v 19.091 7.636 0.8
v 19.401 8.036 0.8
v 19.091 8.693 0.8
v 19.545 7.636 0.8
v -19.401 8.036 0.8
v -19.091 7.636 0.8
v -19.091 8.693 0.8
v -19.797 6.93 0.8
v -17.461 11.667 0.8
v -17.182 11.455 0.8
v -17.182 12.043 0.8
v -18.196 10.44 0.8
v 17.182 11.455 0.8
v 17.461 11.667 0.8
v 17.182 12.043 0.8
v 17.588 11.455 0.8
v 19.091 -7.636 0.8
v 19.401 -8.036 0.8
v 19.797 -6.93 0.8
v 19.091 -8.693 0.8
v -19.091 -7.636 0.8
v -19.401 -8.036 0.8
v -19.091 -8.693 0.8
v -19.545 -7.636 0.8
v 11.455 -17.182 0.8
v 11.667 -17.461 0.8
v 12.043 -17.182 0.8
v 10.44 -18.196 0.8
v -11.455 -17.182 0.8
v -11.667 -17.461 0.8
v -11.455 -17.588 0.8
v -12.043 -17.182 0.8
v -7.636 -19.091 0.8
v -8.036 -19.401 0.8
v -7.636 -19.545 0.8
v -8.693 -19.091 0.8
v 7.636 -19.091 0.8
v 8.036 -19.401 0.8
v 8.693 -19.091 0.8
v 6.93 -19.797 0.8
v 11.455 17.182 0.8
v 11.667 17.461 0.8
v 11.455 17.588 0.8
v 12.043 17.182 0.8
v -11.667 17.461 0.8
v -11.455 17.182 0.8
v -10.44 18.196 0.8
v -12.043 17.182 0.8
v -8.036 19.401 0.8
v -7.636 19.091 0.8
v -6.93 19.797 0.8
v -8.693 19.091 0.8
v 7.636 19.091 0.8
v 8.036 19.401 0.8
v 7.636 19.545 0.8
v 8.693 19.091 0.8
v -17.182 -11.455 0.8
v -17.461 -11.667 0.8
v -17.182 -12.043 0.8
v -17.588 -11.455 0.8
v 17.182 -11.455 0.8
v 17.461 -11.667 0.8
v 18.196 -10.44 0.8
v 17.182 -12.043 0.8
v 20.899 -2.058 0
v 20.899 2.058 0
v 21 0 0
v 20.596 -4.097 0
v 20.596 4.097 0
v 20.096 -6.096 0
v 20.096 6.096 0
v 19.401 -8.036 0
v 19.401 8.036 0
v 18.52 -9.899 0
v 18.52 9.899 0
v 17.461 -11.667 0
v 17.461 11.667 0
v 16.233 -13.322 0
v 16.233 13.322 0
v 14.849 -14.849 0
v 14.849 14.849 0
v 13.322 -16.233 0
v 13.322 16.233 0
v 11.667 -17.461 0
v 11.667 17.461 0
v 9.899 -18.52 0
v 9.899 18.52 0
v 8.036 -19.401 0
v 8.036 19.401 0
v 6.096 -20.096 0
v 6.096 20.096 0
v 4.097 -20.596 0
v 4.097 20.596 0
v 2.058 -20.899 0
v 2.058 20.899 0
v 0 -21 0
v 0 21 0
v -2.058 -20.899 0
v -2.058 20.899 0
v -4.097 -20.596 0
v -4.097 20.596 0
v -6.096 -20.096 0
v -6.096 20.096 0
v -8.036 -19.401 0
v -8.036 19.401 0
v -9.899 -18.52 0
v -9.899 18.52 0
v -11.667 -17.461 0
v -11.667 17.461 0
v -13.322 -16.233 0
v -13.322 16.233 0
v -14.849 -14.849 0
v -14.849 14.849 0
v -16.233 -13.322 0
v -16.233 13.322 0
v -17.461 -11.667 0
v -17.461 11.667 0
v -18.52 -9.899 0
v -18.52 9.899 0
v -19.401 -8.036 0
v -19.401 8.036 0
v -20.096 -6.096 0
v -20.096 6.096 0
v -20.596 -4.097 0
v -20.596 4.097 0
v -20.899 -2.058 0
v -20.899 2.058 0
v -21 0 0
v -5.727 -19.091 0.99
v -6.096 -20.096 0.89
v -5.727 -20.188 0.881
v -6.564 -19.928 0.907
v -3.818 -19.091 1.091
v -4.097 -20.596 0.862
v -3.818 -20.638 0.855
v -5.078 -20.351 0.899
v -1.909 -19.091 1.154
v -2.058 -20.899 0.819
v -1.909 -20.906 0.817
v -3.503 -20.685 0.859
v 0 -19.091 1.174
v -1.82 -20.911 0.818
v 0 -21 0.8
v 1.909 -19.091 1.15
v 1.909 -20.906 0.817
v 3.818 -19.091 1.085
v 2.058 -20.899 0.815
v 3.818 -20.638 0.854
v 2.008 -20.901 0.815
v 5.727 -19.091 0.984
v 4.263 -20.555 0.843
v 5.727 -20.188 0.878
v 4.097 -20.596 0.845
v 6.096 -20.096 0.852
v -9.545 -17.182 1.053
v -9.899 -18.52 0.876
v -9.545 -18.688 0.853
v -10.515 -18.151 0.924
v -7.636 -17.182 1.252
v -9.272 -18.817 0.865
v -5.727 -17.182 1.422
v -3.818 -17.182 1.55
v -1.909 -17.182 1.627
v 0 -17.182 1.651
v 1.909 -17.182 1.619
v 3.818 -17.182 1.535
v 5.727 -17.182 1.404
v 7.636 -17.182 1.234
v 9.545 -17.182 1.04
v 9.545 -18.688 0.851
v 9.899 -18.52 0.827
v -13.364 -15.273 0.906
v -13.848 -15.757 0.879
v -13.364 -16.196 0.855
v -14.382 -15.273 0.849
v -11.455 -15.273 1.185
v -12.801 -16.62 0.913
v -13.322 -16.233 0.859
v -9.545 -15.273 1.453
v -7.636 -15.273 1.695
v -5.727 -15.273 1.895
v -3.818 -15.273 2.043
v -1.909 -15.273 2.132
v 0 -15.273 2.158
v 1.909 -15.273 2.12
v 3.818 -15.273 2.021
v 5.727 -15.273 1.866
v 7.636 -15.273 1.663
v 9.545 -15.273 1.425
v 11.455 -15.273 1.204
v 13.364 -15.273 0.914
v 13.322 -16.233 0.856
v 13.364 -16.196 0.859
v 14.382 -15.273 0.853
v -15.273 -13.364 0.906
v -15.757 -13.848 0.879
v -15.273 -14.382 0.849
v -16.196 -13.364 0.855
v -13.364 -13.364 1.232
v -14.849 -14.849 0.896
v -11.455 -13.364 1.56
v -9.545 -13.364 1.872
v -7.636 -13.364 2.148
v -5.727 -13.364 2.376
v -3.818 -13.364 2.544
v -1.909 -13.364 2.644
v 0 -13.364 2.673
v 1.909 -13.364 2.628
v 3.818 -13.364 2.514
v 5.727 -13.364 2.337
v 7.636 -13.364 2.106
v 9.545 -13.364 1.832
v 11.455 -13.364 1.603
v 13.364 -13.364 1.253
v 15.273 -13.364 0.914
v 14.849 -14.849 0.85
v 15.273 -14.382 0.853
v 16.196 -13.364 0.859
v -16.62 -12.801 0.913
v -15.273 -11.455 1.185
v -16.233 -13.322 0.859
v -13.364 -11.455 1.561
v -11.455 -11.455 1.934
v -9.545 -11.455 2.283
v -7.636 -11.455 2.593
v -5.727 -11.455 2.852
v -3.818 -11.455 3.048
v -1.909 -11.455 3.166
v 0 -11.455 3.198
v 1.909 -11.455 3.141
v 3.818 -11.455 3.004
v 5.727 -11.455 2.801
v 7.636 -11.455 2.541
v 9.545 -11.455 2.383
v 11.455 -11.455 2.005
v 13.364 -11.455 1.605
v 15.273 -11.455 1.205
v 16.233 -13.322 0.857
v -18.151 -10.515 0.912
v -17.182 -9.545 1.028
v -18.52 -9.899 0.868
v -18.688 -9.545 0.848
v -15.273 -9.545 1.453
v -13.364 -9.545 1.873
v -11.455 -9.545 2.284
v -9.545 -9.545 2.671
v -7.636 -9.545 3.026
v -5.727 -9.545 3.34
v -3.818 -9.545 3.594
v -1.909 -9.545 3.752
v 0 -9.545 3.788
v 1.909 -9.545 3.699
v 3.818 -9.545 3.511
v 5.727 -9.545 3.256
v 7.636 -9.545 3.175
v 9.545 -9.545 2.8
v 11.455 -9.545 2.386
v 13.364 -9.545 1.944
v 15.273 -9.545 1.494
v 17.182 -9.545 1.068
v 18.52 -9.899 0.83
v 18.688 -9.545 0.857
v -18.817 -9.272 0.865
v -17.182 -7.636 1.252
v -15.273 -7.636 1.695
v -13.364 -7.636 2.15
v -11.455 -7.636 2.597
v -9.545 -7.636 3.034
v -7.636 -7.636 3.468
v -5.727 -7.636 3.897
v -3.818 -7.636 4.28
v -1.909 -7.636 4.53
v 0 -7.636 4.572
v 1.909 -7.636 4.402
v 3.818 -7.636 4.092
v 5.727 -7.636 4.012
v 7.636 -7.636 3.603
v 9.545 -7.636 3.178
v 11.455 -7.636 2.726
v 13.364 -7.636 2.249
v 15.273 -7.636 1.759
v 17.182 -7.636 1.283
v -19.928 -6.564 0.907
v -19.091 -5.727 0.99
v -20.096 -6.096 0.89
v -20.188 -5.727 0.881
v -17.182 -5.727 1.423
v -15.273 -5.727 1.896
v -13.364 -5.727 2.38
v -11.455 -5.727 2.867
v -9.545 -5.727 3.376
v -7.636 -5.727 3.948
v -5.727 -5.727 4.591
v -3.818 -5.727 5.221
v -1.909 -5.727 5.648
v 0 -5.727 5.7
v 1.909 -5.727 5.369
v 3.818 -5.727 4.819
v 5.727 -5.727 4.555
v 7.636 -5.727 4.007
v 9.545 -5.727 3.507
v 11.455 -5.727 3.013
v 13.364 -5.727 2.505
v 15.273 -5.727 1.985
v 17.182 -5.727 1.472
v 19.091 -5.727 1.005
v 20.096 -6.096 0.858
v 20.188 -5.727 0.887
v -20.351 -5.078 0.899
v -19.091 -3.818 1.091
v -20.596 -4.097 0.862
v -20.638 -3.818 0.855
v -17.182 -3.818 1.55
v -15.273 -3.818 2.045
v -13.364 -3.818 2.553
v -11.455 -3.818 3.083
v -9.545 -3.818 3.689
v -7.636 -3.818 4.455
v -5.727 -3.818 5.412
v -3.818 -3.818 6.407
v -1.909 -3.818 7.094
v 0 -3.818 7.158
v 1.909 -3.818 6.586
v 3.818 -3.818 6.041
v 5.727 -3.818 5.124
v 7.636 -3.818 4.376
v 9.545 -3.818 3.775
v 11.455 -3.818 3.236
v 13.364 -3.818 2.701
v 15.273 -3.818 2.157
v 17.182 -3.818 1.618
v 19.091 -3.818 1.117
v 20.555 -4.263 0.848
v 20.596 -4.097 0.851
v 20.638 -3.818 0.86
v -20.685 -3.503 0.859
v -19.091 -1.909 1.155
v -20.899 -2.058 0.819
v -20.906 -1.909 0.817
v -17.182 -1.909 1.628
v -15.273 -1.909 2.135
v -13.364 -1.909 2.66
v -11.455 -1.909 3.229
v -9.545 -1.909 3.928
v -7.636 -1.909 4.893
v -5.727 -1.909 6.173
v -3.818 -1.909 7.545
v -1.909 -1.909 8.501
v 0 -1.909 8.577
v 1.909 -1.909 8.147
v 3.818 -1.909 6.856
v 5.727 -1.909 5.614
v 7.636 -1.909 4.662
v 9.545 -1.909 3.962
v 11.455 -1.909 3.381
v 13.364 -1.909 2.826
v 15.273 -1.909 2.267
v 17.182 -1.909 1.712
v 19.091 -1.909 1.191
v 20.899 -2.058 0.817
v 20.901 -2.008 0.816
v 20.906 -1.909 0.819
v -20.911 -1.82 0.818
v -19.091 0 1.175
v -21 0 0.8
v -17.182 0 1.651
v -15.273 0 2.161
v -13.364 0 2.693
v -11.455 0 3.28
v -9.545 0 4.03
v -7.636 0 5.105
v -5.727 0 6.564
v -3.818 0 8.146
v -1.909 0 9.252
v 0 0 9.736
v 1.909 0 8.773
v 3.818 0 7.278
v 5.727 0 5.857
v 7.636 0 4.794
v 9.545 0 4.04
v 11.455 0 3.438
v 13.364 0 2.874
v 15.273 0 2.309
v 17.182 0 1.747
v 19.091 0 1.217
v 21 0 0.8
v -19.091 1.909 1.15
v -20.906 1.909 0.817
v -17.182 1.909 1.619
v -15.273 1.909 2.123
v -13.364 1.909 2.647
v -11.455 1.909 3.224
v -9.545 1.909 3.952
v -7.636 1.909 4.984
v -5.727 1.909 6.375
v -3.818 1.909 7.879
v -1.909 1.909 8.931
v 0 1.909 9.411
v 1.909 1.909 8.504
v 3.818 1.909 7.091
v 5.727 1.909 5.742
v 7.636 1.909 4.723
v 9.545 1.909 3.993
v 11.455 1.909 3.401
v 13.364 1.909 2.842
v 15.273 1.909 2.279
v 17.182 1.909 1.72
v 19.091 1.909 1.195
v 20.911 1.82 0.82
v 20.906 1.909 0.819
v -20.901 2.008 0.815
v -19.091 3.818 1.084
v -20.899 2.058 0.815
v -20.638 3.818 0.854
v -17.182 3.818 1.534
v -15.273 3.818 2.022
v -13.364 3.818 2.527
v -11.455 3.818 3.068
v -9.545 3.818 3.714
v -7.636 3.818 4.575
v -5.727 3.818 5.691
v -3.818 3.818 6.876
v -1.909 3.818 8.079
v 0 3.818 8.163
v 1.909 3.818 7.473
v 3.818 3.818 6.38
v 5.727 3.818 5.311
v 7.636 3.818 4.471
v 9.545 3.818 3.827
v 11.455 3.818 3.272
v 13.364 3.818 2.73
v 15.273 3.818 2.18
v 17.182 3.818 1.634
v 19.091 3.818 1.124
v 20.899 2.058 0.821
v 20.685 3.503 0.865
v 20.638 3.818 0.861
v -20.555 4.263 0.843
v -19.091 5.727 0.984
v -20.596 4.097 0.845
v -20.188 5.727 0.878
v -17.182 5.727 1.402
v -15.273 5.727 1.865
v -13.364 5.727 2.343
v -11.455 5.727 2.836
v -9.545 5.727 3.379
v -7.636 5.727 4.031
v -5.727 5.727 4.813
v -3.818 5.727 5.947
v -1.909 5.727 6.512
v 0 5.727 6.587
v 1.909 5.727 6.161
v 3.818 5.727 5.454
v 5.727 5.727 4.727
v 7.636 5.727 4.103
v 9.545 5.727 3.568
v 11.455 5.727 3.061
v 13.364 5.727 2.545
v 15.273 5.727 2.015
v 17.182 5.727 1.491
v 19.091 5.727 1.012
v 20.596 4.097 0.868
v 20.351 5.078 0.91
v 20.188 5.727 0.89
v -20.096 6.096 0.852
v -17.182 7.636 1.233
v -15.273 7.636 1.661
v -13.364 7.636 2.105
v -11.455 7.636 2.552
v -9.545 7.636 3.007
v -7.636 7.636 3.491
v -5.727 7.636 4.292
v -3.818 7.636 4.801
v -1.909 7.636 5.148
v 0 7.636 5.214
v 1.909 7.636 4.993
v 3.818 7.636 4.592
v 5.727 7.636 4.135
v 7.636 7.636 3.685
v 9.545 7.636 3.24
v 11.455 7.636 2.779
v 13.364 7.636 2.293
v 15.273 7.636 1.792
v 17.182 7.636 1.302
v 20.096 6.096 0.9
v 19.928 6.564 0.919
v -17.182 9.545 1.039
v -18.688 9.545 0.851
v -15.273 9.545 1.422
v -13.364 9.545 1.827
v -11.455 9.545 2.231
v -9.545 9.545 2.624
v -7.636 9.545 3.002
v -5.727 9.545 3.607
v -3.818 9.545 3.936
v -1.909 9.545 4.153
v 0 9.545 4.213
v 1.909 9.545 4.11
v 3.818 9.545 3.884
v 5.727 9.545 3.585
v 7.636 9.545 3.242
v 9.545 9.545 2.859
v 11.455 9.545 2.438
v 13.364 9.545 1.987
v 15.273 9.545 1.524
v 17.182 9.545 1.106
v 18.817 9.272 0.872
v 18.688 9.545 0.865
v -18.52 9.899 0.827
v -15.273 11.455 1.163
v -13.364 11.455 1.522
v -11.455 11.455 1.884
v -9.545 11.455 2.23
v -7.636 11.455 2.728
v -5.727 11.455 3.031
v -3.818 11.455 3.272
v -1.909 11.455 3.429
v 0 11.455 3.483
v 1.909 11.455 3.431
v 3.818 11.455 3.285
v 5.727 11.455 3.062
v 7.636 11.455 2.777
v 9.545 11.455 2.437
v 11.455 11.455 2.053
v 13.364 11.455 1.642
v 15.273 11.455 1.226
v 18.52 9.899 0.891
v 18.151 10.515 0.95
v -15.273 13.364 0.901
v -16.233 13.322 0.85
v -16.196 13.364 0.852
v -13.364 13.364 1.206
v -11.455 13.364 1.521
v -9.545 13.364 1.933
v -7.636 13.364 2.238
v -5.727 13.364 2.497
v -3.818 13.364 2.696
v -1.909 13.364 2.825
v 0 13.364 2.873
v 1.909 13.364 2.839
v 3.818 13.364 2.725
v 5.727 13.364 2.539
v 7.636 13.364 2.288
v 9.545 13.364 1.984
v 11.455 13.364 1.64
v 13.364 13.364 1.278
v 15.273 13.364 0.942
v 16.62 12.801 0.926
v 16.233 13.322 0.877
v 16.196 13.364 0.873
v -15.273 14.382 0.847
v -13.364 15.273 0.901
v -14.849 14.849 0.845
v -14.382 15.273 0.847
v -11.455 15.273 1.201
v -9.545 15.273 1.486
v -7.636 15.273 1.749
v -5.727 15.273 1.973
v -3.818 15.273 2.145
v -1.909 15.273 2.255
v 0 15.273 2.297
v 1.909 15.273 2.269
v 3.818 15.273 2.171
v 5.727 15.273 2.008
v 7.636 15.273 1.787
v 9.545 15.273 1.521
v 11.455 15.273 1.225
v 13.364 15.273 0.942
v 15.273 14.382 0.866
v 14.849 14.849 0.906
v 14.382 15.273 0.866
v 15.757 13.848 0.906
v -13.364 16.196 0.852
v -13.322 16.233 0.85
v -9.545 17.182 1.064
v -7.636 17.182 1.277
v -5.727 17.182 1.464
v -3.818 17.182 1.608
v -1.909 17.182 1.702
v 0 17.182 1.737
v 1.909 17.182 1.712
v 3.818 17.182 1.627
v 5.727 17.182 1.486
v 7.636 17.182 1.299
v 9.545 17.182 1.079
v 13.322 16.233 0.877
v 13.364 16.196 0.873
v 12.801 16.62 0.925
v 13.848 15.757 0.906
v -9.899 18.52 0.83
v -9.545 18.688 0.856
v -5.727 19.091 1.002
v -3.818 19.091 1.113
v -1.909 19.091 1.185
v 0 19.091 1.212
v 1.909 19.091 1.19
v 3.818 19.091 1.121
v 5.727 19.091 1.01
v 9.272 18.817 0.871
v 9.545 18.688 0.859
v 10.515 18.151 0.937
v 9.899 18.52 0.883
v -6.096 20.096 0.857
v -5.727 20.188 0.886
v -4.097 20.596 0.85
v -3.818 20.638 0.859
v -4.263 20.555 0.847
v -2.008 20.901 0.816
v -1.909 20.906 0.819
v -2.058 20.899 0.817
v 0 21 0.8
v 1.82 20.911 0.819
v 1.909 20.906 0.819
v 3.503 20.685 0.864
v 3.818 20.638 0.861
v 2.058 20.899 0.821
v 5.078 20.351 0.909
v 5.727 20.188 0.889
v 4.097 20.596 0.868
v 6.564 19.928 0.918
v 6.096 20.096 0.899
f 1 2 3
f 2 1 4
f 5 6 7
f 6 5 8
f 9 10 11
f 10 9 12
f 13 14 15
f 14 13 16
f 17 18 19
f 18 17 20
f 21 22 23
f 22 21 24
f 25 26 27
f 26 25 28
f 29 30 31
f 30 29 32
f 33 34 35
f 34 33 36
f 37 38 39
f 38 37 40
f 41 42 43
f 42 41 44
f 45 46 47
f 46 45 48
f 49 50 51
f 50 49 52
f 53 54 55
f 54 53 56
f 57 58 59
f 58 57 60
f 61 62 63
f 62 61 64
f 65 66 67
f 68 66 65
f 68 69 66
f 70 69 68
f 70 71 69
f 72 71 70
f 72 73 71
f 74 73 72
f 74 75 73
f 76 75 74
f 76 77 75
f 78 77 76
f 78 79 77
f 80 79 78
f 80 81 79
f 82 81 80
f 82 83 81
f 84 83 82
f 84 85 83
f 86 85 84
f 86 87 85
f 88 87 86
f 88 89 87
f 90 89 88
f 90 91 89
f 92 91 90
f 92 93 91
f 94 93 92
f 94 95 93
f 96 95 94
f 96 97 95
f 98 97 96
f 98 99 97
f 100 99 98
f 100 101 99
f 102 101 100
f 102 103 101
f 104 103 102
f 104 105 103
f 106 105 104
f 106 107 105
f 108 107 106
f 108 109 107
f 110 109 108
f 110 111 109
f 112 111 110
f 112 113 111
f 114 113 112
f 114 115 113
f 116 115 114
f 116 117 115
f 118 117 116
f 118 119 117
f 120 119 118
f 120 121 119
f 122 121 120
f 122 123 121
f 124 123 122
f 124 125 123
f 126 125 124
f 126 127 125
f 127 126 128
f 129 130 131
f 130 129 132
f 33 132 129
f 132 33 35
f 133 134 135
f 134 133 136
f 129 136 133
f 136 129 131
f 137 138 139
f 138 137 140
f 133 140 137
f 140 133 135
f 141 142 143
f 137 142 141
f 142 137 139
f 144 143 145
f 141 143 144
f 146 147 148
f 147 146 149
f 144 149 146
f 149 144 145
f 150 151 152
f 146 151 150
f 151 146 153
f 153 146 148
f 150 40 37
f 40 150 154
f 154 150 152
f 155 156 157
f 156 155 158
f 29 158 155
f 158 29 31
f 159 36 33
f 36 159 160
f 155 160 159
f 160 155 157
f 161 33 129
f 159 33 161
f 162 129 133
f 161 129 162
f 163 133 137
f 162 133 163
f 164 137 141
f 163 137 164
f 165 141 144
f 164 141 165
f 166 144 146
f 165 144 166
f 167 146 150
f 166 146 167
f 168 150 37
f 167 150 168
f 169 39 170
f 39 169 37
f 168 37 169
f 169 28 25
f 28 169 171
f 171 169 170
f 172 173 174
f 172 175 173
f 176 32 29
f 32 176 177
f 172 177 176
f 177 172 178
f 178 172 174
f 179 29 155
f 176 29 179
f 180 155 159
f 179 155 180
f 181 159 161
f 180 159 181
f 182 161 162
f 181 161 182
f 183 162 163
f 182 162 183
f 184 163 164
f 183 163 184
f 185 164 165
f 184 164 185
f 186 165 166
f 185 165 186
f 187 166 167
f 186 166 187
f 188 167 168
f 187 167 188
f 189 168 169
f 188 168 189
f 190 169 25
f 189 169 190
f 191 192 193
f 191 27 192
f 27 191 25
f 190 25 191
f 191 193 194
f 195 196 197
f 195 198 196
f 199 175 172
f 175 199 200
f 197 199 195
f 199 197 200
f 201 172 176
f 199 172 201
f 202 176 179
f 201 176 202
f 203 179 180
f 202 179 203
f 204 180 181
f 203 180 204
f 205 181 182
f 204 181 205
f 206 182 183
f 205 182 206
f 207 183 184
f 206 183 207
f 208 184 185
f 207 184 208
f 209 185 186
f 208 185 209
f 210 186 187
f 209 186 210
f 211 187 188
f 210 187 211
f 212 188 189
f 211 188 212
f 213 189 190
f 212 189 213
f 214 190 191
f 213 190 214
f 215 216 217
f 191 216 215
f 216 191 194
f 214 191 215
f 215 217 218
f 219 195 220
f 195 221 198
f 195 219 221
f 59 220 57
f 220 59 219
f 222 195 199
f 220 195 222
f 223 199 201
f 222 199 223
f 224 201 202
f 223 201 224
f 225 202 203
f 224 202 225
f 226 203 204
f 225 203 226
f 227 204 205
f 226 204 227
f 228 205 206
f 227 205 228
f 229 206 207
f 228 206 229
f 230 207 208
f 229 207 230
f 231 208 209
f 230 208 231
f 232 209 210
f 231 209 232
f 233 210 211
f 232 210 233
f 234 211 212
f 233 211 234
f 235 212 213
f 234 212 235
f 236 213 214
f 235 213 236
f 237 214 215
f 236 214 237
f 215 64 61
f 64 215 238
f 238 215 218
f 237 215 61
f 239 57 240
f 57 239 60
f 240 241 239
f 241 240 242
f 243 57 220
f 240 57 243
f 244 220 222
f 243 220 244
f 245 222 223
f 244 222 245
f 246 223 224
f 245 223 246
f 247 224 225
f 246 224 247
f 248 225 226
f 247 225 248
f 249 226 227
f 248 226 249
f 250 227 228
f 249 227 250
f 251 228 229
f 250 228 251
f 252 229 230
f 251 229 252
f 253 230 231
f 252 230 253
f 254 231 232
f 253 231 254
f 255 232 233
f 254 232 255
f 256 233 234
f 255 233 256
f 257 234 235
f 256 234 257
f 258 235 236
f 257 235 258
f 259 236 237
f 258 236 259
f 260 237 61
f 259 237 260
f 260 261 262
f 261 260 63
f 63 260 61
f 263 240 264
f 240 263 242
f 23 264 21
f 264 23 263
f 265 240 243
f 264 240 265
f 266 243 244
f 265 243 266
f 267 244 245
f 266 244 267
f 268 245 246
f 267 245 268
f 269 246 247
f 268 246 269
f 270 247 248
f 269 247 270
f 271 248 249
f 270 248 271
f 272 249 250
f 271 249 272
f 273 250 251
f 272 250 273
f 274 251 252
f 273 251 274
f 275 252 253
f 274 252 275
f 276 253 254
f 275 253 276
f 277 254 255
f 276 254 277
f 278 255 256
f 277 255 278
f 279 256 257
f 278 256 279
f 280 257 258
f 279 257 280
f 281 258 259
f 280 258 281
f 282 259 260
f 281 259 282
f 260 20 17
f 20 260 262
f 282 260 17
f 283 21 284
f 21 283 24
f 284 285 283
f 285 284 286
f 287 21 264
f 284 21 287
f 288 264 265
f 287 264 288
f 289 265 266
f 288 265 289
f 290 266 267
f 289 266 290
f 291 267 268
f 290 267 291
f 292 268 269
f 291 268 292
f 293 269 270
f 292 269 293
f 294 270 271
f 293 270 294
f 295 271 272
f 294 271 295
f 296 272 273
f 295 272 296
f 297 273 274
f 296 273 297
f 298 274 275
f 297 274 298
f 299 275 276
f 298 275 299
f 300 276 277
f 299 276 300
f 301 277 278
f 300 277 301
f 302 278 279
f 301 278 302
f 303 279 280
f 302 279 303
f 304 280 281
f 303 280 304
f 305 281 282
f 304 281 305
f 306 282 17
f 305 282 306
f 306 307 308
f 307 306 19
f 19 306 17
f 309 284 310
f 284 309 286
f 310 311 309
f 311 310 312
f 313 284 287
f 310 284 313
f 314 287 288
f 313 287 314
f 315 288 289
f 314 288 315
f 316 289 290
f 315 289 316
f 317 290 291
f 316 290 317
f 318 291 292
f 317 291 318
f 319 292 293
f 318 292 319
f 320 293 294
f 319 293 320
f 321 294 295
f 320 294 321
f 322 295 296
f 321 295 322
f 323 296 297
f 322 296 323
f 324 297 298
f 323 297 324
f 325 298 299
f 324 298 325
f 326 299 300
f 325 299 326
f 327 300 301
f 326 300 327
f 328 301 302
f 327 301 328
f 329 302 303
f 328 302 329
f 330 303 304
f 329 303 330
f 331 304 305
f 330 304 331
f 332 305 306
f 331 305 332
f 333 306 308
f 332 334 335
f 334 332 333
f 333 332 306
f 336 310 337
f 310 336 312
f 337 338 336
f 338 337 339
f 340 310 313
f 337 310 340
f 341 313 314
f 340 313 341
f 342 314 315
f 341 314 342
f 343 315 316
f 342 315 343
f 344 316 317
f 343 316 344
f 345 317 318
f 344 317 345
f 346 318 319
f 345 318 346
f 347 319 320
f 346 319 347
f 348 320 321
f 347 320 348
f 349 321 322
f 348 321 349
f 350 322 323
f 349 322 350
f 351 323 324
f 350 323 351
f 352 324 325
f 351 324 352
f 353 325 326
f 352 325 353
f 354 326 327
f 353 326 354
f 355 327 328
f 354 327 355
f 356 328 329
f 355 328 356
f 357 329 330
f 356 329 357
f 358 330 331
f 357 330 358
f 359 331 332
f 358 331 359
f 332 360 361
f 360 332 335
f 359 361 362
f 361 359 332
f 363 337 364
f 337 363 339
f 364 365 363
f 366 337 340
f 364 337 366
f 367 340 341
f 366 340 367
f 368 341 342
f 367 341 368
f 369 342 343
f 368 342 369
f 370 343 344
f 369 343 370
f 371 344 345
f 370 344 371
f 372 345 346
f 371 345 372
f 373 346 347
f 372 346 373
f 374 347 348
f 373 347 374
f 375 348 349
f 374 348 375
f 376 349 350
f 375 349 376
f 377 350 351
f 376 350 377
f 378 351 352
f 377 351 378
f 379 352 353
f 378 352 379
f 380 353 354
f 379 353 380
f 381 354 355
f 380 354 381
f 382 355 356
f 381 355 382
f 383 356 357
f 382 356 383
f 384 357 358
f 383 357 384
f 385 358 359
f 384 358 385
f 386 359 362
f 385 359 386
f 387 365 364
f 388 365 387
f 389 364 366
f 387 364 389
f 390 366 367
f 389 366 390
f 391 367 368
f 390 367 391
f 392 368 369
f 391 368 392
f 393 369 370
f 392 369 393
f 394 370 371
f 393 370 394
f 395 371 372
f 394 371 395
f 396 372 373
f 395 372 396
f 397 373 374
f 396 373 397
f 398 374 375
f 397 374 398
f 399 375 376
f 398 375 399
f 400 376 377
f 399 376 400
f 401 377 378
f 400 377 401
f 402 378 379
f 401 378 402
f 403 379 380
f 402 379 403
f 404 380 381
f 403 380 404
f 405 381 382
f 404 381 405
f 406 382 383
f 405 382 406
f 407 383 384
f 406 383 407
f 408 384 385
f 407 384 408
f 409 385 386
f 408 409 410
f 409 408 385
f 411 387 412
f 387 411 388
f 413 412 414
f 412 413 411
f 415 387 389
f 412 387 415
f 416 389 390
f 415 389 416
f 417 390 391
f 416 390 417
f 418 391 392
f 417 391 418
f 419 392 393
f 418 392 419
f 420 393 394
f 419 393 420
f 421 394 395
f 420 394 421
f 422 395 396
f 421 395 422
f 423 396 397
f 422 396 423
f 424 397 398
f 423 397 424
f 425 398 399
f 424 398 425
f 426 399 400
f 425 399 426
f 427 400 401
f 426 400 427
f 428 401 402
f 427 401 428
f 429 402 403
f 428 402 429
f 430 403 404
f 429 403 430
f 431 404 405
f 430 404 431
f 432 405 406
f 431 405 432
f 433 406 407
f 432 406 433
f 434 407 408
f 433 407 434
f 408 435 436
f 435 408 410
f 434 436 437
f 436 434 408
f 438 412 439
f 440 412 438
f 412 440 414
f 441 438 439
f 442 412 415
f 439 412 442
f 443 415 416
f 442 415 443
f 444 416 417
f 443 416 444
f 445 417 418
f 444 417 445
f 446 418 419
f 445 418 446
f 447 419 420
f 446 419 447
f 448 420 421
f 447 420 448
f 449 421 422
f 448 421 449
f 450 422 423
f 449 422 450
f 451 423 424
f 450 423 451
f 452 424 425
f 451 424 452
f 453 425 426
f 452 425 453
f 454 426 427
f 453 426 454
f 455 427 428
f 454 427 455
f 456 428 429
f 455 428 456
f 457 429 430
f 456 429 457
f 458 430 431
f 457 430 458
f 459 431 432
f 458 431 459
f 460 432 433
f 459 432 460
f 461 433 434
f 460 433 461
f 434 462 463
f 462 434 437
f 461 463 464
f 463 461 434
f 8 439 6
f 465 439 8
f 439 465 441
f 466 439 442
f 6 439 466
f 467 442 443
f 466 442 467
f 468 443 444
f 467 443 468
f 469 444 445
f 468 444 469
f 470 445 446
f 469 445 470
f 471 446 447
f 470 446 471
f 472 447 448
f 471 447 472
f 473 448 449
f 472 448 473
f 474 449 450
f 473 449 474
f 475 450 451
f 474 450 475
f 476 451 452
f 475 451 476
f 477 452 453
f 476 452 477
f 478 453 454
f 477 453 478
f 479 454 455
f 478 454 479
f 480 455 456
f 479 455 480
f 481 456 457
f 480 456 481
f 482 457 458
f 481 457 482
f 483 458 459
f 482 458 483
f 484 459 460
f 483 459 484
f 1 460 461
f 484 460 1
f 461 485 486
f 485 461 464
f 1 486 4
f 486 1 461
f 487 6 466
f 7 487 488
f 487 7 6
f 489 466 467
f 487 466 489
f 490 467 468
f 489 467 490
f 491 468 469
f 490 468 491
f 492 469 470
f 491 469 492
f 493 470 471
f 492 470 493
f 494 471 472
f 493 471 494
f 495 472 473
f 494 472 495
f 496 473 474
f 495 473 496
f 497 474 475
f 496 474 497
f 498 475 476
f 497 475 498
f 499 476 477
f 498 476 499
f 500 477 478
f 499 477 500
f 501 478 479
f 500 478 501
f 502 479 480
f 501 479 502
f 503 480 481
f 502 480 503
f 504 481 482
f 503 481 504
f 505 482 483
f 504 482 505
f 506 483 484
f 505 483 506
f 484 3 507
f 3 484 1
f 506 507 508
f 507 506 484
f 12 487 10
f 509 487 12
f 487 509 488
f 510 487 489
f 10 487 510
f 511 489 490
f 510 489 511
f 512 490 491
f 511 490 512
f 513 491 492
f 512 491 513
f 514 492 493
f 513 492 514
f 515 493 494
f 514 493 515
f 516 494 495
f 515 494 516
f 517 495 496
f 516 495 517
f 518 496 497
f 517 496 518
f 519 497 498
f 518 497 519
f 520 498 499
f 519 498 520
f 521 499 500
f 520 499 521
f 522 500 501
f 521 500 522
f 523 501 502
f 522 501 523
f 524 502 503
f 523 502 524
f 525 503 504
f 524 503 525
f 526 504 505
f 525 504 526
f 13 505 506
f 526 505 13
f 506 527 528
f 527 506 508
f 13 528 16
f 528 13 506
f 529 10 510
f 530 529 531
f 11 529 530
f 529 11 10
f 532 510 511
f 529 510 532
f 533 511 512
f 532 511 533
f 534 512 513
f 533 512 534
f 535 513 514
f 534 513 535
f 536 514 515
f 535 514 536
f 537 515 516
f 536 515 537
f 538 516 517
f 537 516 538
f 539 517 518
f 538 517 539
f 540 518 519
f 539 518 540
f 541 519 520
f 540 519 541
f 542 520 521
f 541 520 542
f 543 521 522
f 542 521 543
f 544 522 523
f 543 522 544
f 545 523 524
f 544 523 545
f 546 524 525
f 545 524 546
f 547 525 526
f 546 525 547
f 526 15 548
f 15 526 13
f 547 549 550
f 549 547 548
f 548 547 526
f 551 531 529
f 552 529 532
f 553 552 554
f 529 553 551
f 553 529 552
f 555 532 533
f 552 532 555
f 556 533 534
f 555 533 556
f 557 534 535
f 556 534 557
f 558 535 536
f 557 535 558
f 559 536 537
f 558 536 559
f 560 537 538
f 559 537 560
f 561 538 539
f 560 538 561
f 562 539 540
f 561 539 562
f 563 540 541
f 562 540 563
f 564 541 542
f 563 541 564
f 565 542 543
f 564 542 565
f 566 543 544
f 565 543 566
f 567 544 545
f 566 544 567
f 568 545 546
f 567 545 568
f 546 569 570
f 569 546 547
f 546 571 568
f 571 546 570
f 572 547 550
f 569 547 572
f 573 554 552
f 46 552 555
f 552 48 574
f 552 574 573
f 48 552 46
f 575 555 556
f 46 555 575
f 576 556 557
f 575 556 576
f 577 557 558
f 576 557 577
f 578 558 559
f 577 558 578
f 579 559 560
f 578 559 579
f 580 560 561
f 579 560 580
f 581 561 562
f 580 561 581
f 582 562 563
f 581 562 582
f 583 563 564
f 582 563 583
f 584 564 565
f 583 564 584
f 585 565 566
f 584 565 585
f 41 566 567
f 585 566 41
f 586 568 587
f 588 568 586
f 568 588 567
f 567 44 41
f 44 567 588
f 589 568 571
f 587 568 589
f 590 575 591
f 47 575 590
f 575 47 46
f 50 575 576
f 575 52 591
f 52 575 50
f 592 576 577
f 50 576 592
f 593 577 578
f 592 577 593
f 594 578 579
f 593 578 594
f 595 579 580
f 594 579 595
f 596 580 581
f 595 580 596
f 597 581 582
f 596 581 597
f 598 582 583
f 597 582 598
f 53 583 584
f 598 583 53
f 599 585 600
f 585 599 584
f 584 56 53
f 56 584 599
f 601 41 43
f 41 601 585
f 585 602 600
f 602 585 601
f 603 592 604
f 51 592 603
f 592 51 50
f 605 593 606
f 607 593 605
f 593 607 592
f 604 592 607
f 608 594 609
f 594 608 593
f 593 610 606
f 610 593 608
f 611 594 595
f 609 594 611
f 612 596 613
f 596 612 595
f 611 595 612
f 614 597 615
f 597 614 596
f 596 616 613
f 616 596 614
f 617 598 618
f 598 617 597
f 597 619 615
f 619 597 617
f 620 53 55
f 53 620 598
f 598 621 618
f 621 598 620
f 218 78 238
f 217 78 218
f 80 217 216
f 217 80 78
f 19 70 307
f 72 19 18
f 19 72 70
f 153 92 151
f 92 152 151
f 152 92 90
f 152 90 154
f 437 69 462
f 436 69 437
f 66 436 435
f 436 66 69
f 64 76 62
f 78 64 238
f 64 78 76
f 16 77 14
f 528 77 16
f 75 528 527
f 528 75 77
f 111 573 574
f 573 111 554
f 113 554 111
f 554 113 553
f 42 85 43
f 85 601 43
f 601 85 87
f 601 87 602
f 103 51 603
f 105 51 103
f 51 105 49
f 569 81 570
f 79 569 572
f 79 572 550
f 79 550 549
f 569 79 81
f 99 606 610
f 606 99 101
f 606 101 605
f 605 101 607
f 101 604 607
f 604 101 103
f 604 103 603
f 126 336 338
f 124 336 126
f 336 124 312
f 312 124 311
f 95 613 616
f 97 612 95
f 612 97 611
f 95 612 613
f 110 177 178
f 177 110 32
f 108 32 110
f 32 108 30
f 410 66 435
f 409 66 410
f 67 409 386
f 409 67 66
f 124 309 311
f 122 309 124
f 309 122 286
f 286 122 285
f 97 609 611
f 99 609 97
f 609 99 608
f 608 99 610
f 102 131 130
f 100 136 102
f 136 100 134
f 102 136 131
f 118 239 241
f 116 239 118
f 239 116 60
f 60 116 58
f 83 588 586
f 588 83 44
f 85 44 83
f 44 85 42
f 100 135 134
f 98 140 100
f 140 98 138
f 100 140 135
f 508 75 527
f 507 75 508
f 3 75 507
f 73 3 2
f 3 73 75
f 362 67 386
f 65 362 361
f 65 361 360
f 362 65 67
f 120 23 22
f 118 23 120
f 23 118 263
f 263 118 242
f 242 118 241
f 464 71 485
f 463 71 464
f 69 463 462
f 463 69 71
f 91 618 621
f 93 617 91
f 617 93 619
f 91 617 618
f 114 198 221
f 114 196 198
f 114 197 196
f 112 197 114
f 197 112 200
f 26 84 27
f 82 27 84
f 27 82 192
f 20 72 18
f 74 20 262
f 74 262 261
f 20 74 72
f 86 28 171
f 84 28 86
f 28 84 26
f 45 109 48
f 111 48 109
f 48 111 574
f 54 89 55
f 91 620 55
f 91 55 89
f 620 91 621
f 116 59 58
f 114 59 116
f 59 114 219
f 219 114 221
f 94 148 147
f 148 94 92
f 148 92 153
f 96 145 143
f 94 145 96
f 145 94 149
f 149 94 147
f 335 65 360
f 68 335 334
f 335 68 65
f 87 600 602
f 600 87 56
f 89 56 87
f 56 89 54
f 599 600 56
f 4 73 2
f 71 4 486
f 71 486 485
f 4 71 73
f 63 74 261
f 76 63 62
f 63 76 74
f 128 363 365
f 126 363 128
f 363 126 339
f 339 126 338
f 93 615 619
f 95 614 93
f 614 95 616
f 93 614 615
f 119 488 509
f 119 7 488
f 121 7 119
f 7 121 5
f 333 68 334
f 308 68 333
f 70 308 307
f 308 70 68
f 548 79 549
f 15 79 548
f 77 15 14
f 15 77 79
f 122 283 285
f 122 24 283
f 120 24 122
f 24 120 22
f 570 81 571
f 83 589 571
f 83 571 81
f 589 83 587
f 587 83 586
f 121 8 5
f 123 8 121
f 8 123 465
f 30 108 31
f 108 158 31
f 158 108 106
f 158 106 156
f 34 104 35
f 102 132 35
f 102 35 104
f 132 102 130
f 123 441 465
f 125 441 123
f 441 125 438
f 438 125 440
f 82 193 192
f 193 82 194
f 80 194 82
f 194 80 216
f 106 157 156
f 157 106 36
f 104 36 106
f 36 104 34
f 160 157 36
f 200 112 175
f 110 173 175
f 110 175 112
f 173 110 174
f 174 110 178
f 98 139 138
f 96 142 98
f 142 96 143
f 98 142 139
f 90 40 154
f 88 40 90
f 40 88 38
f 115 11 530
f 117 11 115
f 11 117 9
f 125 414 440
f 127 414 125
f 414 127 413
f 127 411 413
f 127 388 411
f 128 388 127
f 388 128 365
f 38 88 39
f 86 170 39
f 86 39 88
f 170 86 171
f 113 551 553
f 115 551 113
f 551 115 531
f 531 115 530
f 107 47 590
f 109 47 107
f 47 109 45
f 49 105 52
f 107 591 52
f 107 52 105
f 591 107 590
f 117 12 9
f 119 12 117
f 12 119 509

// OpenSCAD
// Low-Poly Faceted Rocky Mountain Base Test
$fn = 32;

module lowpoly_rocky_mountain_base(r = 21, grid_n = 22) {
    step = (2 * r) / grid_n;
    
    // Low-poly terrain height function with sharp mountain ridges and rock outcrops
    function terrain_z(x, y) = 
        let (
            dist = sqrt(x*x + y*y),
            taper = (dist >= r - 0.5) ? 0 : pow(cos(min(1.0, dist / r) * 90), 1.2),
            
            // Sharp angular low-poly ridges
            r1 = pow(abs(sin(x * 0.35 + y * 0.22 + 0.4)), 1.8) * 4.2,
            r2 = pow(abs(cos(x * 0.45 - y * 0.38 - 0.7)), 2.0) * 3.5,
            
            // Rocky peak summit
            peak = 4.8 * exp(-((x + 1.0)*(x + 1.0) + (y - 0.5)*(y - 0.5)) / 36),
            
            // Angular facet noise
            n1 = floor(sin(x * 0.8 + y * 0.6) * 3.0) * 0.4,
            n2 = floor(cos(x * 1.4 - y * 1.2) * 2.5) * 0.3,
            
            raw_h = 1.0 + peak + r1 + r2 + n1 + n2,
            
            z_val = 0.8 + max(0, raw_h - 0.8) * taper
        ) z_val;

    // Build grid vertices
    top_verts = [
        for (yi = [0 : grid_n])
            for (xi = [0 : grid_n])
                let (
                    x = -r + xi * step,
                    y = -r + yi * step,
                    z = terrain_z(x, y)
                )
                [x, y, z]
    ];
    
    bot_verts = [
        for (yi = [0 : grid_n])
            for (xi = [0 : grid_n])
                let (
                    x = -r + xi * step,
                    y = -r + yi * step
                )
                [x, y, 0]
    ];
    
    all_verts = concat(top_verts, bot_verts);
    num_pts = len(top_verts);
    
    function idx(xi, yi) = yi * (grid_n + 1) + xi;
    function bidx(xi, yi) = num_pts + yi * (grid_n + 1) + xi;
    
    // Render top faces as individual low-poly facet prisms for crisp sharp edges
    intersection() {
        cylinder(r = r, h = 12, $fn = 64);
        
        union() {
            // Flat base slab
            cylinder(r = r + 2, h = 0.8, $fn = 64);
            
            // Low-poly facet blocks
            for (yi = [0 : grid_n - 1]) {
                for (xi = [0 : grid_n - 1]) {
                    p00 = top_verts[idx(xi, yi)];
                    p10 = top_verts[idx(xi + 1, yi)];
                    p11 = top_verts[idx(xi + 1, yi + 1)];
                    p01 = top_verts[idx(xi, yi + 1)];
                    
                    // Triangle 1
                    polyhedron(
                        points = [
                            p00, p10, p11,
                            [p00[0], p00[1], 0], [p10[0], p10[1], 0], [p11[0], p11[1], 0]
                        ],
                        faces = [
                            [0, 1, 2], // top
                            [3, 5, 4], // bot
                            [0, 3, 4], [0, 4, 1],
                            [1, 4, 5], [1, 5, 2],
                            [2, 5, 3], [2, 3, 0]
                        ],
                        convexity = 4
                    );
                    
                    // Triangle 2
                    polyhedron(
                        points = [
                            p00, p11, p01,
                            [p00[0], p00[1], 0], [p11[0], p11[1], 0], [p01[0], p01[1], 0]
                        ],
                        faces = [
                            [0, 1, 2], // top
                            [3, 5, 4], // bot
                            [0, 3, 4], [0, 4, 1],
                            [1, 4, 5], [1, 5, 2],
                            [2, 5, 3], [2, 3, 0]
                        ],
                        convexity = 4
                    );
                }
            }
        }
    }
}

lowpoly_rocky_mountain_base();
